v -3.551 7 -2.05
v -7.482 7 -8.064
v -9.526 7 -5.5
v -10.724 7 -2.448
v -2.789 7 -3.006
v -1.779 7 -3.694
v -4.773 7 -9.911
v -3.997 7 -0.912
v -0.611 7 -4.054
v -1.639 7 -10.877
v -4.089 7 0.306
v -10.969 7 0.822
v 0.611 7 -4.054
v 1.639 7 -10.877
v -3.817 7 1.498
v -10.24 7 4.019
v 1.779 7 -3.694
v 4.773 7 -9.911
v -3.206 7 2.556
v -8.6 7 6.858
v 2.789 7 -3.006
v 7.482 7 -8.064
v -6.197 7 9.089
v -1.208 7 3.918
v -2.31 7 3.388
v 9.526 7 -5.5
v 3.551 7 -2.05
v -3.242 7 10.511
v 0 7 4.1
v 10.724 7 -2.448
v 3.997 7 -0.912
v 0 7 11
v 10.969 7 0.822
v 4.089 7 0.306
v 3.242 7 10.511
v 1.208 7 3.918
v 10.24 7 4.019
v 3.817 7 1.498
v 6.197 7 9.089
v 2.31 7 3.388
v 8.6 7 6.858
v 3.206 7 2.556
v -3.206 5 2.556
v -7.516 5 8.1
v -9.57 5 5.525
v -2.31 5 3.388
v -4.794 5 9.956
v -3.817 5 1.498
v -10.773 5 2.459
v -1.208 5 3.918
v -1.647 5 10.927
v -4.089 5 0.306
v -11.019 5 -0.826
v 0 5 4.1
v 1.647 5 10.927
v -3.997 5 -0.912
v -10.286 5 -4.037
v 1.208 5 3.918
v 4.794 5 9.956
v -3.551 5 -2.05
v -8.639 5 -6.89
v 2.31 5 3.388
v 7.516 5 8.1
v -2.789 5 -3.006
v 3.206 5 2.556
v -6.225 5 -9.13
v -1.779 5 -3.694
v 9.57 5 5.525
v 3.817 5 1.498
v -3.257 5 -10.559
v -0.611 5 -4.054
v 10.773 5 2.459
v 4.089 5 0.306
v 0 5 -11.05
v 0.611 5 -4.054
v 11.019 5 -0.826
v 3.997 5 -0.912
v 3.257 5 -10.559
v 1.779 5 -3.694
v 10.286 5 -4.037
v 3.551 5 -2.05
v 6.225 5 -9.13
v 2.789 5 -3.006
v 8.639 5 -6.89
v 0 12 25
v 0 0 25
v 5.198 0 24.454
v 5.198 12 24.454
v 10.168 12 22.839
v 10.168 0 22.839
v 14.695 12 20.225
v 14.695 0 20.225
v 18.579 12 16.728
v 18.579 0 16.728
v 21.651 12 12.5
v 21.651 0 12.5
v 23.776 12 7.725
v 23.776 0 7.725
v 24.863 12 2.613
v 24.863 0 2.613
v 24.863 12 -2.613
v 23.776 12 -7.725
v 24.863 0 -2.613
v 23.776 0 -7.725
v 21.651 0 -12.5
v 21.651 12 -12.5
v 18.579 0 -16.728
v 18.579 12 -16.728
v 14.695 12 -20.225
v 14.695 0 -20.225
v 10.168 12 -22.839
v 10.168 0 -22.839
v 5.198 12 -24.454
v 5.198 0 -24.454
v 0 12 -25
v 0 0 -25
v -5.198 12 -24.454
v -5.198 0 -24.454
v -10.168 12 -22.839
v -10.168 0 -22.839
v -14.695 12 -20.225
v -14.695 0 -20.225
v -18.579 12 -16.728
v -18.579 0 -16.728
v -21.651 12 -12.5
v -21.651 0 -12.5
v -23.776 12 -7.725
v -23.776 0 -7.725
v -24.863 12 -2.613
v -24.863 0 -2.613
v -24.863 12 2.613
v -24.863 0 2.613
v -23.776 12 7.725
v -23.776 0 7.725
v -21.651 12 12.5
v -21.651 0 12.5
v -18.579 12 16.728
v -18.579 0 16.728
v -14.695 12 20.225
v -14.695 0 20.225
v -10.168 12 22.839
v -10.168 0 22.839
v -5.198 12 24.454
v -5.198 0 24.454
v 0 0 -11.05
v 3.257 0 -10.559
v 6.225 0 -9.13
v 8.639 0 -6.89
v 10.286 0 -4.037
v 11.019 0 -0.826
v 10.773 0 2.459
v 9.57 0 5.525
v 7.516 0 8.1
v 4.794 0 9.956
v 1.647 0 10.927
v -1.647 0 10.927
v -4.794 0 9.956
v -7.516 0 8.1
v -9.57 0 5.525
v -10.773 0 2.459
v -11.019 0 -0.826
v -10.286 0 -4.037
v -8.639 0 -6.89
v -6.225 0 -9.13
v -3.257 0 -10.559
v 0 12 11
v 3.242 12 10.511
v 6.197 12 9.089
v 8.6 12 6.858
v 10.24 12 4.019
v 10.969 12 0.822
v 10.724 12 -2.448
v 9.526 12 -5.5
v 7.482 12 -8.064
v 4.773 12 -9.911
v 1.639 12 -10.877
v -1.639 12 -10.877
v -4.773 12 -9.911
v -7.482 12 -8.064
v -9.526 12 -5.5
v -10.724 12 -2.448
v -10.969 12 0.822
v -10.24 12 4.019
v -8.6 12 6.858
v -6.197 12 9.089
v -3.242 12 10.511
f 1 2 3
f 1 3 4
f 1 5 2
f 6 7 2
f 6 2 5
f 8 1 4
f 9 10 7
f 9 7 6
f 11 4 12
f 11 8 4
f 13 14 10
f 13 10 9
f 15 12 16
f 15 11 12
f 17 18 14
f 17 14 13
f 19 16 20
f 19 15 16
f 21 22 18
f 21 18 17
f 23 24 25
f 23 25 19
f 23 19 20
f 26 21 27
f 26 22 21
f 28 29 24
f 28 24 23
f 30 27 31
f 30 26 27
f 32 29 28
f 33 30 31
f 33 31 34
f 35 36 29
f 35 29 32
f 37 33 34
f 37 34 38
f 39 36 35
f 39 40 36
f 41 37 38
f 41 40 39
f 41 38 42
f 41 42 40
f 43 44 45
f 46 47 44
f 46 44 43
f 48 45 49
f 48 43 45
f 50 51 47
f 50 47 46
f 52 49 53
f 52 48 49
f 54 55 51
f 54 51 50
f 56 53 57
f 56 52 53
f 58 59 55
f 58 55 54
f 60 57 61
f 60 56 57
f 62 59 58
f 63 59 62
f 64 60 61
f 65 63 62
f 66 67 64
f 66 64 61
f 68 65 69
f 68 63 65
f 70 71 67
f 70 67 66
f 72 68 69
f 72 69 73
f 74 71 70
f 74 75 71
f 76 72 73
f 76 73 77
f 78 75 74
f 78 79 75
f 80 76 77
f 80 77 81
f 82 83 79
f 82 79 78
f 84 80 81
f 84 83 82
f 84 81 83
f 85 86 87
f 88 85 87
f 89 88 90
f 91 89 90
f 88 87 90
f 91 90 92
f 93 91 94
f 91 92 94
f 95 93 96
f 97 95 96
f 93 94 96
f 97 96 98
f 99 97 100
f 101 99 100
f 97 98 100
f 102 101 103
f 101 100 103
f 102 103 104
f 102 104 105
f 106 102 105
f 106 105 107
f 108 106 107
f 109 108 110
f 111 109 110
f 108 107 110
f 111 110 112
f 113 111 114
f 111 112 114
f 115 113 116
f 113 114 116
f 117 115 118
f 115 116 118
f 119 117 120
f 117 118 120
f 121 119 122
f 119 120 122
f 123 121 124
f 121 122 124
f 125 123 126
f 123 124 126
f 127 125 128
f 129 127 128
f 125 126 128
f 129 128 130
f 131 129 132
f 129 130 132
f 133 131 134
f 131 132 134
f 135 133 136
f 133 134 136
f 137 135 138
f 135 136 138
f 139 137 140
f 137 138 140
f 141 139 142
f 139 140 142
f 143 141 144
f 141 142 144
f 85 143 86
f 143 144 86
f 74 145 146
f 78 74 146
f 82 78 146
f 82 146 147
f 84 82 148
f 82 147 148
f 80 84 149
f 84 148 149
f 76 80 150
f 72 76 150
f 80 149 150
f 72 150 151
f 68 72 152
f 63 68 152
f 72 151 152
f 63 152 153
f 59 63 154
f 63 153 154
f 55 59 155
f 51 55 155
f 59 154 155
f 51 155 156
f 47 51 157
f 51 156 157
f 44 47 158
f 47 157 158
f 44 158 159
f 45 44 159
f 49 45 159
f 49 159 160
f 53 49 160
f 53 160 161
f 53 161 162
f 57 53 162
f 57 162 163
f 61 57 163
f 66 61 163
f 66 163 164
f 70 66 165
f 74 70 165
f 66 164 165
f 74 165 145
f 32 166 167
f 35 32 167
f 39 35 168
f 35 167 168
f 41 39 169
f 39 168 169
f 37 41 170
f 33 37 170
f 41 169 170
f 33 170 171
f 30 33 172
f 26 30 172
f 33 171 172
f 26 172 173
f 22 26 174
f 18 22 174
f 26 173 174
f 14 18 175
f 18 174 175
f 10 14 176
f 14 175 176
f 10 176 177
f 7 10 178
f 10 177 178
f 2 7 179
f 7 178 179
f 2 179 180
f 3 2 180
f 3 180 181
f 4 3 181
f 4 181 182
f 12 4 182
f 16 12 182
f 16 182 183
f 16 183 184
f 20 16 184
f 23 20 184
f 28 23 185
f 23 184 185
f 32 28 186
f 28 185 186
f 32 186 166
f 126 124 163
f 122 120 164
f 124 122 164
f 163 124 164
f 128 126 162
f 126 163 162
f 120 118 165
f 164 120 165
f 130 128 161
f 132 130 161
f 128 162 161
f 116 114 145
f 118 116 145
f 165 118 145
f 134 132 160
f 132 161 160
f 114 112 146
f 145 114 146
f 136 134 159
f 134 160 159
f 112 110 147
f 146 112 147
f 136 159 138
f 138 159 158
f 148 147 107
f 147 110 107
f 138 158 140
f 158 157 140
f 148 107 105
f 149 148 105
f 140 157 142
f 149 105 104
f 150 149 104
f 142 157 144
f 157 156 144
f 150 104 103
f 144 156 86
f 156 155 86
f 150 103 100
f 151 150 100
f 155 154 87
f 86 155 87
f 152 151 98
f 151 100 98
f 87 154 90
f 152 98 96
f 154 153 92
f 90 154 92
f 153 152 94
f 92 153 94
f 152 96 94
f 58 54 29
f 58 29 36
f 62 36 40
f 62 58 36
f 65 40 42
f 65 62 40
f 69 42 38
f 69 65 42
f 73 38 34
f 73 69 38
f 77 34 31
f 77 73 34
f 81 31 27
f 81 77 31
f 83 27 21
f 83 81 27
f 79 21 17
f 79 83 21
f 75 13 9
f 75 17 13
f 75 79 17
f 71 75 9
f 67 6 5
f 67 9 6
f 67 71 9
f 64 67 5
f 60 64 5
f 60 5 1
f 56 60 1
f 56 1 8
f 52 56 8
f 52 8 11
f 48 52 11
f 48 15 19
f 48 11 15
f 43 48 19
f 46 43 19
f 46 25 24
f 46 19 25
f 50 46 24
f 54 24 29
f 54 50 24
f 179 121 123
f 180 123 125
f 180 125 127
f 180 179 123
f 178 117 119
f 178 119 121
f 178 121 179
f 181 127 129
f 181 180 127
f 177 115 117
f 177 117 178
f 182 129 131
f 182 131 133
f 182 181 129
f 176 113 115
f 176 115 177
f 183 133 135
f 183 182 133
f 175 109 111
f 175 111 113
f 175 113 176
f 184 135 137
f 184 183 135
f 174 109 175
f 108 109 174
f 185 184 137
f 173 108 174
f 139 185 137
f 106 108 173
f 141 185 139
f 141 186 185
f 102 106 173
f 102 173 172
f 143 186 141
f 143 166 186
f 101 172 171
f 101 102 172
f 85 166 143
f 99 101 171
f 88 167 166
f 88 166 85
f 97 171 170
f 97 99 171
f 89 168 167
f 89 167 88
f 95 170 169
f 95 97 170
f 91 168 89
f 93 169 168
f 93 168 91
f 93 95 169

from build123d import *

# Parameters (mm, degrees)
SKETCH1_R           = 25
SKETCH1_R_2         = 4.1
BOSS_EXTRUDE1_DEPTH = 12
SKETCH2_R           = 11
CUT_EXTRUDE1_DEPTH  = 5
SKETCH3_R           = 11.05
CUT_EXTRUDE2_DEPTH  = 5


with BuildPart() as part:
    # Sketch1 → Boss-Extrude1 (new body)
    with BuildSketch(Plane(origin=(0, 0, 0), x_dir=(1, 0, 0), z_dir=(0, 1, 0))):
        with Locations(Location((0, 0, 0), (0, 0, 270))):
            Circle(SKETCH1_R)
        with Locations(Location((0, 0, 0), (0, 0, 270))):
            Circle(SKETCH1_R_2, mode=Mode.SUBTRACT)
    extrude(amount=BOSS_EXTRUDE1_DEPTH)

    # Sketch2 → Cut-Extrude1 (cut)
    with BuildSketch(Plane(origin=(0, 12, 0), x_dir=(1, 0, 0), z_dir=(0, 1, 0))):
        with Locations(Location((0, 0, 0), (0, 0, 270))):
            Circle(SKETCH2_R)
    extrude(amount=-CUT_EXTRUDE1_DEPTH, mode=Mode.SUBTRACT)

    # Sketch3 → Cut-Extrude2 (cut)
    with BuildSketch(Plane.XZ):
        with Locations(Location((0, 0, 0), (0, 0, 270))):
            Circle(SKETCH3_R)
    extrude(amount=-CUT_EXTRUDE2_DEPTH, mode=Mode.SUBTRACT)


solid = part.part
